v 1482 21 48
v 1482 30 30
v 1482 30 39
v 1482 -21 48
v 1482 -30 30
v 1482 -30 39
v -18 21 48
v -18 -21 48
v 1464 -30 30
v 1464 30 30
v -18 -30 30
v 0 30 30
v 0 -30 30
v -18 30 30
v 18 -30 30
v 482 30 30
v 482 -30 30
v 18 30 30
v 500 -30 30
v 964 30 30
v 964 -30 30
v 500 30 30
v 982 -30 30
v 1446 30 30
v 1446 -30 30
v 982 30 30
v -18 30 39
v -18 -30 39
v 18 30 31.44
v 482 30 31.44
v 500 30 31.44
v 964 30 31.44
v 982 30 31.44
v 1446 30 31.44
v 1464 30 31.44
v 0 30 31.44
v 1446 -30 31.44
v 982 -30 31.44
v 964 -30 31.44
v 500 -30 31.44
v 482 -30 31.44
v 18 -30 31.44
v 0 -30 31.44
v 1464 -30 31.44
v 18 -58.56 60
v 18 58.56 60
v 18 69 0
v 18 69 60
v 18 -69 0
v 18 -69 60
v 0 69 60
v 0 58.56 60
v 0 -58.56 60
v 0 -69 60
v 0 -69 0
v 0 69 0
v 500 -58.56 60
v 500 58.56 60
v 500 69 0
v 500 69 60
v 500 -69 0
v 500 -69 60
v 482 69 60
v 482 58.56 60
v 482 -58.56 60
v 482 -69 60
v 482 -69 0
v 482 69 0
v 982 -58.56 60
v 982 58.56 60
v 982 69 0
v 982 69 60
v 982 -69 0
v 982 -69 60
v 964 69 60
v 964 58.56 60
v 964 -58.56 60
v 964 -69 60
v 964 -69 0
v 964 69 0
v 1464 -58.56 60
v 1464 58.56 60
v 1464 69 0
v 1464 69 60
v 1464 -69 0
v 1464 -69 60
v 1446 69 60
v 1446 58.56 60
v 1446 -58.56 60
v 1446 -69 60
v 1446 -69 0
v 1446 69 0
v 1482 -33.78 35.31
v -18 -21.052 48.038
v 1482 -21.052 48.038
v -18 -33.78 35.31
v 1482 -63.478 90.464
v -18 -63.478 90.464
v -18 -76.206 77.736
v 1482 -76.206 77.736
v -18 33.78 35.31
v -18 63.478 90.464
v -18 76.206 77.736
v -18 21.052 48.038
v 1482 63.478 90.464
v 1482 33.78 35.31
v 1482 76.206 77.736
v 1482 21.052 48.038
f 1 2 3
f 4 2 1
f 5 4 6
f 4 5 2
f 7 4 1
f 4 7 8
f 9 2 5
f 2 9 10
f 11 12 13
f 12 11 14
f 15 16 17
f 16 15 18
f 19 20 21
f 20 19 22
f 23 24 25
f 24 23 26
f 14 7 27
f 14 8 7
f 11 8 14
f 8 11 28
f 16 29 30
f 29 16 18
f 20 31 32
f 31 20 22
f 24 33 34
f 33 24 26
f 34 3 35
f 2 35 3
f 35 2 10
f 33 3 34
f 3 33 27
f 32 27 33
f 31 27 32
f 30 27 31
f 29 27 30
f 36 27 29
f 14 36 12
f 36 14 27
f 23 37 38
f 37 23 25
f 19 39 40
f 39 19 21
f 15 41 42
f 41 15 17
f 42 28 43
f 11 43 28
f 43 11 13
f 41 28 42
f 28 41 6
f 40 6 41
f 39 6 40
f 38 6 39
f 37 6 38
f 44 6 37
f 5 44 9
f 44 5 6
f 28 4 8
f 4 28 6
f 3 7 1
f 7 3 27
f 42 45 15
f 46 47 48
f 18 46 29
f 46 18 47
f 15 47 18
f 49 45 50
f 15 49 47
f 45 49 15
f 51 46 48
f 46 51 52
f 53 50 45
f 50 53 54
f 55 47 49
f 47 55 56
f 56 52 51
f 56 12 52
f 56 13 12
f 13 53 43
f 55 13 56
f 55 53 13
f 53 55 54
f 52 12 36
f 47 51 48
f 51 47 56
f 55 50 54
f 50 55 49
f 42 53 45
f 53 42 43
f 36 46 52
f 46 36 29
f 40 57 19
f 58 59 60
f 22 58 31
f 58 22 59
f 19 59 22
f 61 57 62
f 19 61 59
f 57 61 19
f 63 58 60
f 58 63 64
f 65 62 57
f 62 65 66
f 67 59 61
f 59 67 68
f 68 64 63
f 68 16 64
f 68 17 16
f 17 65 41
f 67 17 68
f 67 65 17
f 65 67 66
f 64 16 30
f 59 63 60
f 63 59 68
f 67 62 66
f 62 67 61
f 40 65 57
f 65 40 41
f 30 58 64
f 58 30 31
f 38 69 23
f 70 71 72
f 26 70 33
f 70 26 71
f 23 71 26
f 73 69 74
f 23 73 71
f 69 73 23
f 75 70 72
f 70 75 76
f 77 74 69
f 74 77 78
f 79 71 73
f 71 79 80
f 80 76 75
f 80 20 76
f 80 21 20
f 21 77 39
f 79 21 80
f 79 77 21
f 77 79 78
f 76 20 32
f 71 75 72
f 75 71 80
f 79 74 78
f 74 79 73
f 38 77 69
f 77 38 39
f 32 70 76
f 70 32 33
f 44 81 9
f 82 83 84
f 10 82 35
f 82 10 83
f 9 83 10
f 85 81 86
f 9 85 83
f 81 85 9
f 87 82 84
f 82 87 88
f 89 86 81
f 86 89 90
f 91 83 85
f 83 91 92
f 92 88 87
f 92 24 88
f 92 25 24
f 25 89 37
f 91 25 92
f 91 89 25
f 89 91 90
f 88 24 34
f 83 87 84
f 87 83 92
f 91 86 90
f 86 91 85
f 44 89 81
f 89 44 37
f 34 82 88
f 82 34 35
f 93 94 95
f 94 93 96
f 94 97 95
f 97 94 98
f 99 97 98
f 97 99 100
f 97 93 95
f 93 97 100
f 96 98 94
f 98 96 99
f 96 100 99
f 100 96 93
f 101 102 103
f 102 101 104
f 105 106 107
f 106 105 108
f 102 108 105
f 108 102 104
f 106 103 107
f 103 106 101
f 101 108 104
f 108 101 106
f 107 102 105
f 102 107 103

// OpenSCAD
// (c) 2014 juewei@fabfolk.com
//
// slide for bambi trebuchet

module slide_support(h=60,d=18,l=150,w=60,z=18)
{
  // w & z are the dimensions of the boards placed on the support. 
  // Needed for fine tuning.

  a=0.08*z;
  difference()
    {
      translate([0,.5*w-.5*l,0]) cube([d,l,h]);
      translate([-10,0,0.5*h]) rotate([0,0,0]) cube([d+20,w,w]);
      translate([-10,0,0.5*h+a]) rotate([45,0,0]) cube([d+20,w,w]);
      translate([-10,w,0.5*h+a]) rotate([45,0,0]) cube([d+20,w,w]);
    }
}

module slide(w=60,d=18,l=1500)
{

  uw=2.3*w;
  uh=w;
  ud=d;

  translate([-ud,-0.5*w,0.5*uh]) 
    {
      difference()
	{
	  cube([l, w, d]);
	  translate([-10,-.5*d,0]) rotate([45,0,0]) cube([l+20,2*d,2*d]);
	  translate([-10,w+.5*d,0]) rotate([45,0,0]) cube([l+20,2*d,2*d]);
	}
      translate([0, -.21*d,0.295*d]) rotate([45,0,0]) cube([l,d,w]);
      translate([0,w+.21*d,0.295*d]) rotate([45,0,0]) cube([l,w,d]);

      for (x = [ud : (l-ud-2*ud)/3 : l-ud]) 
	{
	  translate([x,0,-0.5*uh]) slide_support(uh,ud,uw,w,d);
	}
    }
}

slide(d=18);
